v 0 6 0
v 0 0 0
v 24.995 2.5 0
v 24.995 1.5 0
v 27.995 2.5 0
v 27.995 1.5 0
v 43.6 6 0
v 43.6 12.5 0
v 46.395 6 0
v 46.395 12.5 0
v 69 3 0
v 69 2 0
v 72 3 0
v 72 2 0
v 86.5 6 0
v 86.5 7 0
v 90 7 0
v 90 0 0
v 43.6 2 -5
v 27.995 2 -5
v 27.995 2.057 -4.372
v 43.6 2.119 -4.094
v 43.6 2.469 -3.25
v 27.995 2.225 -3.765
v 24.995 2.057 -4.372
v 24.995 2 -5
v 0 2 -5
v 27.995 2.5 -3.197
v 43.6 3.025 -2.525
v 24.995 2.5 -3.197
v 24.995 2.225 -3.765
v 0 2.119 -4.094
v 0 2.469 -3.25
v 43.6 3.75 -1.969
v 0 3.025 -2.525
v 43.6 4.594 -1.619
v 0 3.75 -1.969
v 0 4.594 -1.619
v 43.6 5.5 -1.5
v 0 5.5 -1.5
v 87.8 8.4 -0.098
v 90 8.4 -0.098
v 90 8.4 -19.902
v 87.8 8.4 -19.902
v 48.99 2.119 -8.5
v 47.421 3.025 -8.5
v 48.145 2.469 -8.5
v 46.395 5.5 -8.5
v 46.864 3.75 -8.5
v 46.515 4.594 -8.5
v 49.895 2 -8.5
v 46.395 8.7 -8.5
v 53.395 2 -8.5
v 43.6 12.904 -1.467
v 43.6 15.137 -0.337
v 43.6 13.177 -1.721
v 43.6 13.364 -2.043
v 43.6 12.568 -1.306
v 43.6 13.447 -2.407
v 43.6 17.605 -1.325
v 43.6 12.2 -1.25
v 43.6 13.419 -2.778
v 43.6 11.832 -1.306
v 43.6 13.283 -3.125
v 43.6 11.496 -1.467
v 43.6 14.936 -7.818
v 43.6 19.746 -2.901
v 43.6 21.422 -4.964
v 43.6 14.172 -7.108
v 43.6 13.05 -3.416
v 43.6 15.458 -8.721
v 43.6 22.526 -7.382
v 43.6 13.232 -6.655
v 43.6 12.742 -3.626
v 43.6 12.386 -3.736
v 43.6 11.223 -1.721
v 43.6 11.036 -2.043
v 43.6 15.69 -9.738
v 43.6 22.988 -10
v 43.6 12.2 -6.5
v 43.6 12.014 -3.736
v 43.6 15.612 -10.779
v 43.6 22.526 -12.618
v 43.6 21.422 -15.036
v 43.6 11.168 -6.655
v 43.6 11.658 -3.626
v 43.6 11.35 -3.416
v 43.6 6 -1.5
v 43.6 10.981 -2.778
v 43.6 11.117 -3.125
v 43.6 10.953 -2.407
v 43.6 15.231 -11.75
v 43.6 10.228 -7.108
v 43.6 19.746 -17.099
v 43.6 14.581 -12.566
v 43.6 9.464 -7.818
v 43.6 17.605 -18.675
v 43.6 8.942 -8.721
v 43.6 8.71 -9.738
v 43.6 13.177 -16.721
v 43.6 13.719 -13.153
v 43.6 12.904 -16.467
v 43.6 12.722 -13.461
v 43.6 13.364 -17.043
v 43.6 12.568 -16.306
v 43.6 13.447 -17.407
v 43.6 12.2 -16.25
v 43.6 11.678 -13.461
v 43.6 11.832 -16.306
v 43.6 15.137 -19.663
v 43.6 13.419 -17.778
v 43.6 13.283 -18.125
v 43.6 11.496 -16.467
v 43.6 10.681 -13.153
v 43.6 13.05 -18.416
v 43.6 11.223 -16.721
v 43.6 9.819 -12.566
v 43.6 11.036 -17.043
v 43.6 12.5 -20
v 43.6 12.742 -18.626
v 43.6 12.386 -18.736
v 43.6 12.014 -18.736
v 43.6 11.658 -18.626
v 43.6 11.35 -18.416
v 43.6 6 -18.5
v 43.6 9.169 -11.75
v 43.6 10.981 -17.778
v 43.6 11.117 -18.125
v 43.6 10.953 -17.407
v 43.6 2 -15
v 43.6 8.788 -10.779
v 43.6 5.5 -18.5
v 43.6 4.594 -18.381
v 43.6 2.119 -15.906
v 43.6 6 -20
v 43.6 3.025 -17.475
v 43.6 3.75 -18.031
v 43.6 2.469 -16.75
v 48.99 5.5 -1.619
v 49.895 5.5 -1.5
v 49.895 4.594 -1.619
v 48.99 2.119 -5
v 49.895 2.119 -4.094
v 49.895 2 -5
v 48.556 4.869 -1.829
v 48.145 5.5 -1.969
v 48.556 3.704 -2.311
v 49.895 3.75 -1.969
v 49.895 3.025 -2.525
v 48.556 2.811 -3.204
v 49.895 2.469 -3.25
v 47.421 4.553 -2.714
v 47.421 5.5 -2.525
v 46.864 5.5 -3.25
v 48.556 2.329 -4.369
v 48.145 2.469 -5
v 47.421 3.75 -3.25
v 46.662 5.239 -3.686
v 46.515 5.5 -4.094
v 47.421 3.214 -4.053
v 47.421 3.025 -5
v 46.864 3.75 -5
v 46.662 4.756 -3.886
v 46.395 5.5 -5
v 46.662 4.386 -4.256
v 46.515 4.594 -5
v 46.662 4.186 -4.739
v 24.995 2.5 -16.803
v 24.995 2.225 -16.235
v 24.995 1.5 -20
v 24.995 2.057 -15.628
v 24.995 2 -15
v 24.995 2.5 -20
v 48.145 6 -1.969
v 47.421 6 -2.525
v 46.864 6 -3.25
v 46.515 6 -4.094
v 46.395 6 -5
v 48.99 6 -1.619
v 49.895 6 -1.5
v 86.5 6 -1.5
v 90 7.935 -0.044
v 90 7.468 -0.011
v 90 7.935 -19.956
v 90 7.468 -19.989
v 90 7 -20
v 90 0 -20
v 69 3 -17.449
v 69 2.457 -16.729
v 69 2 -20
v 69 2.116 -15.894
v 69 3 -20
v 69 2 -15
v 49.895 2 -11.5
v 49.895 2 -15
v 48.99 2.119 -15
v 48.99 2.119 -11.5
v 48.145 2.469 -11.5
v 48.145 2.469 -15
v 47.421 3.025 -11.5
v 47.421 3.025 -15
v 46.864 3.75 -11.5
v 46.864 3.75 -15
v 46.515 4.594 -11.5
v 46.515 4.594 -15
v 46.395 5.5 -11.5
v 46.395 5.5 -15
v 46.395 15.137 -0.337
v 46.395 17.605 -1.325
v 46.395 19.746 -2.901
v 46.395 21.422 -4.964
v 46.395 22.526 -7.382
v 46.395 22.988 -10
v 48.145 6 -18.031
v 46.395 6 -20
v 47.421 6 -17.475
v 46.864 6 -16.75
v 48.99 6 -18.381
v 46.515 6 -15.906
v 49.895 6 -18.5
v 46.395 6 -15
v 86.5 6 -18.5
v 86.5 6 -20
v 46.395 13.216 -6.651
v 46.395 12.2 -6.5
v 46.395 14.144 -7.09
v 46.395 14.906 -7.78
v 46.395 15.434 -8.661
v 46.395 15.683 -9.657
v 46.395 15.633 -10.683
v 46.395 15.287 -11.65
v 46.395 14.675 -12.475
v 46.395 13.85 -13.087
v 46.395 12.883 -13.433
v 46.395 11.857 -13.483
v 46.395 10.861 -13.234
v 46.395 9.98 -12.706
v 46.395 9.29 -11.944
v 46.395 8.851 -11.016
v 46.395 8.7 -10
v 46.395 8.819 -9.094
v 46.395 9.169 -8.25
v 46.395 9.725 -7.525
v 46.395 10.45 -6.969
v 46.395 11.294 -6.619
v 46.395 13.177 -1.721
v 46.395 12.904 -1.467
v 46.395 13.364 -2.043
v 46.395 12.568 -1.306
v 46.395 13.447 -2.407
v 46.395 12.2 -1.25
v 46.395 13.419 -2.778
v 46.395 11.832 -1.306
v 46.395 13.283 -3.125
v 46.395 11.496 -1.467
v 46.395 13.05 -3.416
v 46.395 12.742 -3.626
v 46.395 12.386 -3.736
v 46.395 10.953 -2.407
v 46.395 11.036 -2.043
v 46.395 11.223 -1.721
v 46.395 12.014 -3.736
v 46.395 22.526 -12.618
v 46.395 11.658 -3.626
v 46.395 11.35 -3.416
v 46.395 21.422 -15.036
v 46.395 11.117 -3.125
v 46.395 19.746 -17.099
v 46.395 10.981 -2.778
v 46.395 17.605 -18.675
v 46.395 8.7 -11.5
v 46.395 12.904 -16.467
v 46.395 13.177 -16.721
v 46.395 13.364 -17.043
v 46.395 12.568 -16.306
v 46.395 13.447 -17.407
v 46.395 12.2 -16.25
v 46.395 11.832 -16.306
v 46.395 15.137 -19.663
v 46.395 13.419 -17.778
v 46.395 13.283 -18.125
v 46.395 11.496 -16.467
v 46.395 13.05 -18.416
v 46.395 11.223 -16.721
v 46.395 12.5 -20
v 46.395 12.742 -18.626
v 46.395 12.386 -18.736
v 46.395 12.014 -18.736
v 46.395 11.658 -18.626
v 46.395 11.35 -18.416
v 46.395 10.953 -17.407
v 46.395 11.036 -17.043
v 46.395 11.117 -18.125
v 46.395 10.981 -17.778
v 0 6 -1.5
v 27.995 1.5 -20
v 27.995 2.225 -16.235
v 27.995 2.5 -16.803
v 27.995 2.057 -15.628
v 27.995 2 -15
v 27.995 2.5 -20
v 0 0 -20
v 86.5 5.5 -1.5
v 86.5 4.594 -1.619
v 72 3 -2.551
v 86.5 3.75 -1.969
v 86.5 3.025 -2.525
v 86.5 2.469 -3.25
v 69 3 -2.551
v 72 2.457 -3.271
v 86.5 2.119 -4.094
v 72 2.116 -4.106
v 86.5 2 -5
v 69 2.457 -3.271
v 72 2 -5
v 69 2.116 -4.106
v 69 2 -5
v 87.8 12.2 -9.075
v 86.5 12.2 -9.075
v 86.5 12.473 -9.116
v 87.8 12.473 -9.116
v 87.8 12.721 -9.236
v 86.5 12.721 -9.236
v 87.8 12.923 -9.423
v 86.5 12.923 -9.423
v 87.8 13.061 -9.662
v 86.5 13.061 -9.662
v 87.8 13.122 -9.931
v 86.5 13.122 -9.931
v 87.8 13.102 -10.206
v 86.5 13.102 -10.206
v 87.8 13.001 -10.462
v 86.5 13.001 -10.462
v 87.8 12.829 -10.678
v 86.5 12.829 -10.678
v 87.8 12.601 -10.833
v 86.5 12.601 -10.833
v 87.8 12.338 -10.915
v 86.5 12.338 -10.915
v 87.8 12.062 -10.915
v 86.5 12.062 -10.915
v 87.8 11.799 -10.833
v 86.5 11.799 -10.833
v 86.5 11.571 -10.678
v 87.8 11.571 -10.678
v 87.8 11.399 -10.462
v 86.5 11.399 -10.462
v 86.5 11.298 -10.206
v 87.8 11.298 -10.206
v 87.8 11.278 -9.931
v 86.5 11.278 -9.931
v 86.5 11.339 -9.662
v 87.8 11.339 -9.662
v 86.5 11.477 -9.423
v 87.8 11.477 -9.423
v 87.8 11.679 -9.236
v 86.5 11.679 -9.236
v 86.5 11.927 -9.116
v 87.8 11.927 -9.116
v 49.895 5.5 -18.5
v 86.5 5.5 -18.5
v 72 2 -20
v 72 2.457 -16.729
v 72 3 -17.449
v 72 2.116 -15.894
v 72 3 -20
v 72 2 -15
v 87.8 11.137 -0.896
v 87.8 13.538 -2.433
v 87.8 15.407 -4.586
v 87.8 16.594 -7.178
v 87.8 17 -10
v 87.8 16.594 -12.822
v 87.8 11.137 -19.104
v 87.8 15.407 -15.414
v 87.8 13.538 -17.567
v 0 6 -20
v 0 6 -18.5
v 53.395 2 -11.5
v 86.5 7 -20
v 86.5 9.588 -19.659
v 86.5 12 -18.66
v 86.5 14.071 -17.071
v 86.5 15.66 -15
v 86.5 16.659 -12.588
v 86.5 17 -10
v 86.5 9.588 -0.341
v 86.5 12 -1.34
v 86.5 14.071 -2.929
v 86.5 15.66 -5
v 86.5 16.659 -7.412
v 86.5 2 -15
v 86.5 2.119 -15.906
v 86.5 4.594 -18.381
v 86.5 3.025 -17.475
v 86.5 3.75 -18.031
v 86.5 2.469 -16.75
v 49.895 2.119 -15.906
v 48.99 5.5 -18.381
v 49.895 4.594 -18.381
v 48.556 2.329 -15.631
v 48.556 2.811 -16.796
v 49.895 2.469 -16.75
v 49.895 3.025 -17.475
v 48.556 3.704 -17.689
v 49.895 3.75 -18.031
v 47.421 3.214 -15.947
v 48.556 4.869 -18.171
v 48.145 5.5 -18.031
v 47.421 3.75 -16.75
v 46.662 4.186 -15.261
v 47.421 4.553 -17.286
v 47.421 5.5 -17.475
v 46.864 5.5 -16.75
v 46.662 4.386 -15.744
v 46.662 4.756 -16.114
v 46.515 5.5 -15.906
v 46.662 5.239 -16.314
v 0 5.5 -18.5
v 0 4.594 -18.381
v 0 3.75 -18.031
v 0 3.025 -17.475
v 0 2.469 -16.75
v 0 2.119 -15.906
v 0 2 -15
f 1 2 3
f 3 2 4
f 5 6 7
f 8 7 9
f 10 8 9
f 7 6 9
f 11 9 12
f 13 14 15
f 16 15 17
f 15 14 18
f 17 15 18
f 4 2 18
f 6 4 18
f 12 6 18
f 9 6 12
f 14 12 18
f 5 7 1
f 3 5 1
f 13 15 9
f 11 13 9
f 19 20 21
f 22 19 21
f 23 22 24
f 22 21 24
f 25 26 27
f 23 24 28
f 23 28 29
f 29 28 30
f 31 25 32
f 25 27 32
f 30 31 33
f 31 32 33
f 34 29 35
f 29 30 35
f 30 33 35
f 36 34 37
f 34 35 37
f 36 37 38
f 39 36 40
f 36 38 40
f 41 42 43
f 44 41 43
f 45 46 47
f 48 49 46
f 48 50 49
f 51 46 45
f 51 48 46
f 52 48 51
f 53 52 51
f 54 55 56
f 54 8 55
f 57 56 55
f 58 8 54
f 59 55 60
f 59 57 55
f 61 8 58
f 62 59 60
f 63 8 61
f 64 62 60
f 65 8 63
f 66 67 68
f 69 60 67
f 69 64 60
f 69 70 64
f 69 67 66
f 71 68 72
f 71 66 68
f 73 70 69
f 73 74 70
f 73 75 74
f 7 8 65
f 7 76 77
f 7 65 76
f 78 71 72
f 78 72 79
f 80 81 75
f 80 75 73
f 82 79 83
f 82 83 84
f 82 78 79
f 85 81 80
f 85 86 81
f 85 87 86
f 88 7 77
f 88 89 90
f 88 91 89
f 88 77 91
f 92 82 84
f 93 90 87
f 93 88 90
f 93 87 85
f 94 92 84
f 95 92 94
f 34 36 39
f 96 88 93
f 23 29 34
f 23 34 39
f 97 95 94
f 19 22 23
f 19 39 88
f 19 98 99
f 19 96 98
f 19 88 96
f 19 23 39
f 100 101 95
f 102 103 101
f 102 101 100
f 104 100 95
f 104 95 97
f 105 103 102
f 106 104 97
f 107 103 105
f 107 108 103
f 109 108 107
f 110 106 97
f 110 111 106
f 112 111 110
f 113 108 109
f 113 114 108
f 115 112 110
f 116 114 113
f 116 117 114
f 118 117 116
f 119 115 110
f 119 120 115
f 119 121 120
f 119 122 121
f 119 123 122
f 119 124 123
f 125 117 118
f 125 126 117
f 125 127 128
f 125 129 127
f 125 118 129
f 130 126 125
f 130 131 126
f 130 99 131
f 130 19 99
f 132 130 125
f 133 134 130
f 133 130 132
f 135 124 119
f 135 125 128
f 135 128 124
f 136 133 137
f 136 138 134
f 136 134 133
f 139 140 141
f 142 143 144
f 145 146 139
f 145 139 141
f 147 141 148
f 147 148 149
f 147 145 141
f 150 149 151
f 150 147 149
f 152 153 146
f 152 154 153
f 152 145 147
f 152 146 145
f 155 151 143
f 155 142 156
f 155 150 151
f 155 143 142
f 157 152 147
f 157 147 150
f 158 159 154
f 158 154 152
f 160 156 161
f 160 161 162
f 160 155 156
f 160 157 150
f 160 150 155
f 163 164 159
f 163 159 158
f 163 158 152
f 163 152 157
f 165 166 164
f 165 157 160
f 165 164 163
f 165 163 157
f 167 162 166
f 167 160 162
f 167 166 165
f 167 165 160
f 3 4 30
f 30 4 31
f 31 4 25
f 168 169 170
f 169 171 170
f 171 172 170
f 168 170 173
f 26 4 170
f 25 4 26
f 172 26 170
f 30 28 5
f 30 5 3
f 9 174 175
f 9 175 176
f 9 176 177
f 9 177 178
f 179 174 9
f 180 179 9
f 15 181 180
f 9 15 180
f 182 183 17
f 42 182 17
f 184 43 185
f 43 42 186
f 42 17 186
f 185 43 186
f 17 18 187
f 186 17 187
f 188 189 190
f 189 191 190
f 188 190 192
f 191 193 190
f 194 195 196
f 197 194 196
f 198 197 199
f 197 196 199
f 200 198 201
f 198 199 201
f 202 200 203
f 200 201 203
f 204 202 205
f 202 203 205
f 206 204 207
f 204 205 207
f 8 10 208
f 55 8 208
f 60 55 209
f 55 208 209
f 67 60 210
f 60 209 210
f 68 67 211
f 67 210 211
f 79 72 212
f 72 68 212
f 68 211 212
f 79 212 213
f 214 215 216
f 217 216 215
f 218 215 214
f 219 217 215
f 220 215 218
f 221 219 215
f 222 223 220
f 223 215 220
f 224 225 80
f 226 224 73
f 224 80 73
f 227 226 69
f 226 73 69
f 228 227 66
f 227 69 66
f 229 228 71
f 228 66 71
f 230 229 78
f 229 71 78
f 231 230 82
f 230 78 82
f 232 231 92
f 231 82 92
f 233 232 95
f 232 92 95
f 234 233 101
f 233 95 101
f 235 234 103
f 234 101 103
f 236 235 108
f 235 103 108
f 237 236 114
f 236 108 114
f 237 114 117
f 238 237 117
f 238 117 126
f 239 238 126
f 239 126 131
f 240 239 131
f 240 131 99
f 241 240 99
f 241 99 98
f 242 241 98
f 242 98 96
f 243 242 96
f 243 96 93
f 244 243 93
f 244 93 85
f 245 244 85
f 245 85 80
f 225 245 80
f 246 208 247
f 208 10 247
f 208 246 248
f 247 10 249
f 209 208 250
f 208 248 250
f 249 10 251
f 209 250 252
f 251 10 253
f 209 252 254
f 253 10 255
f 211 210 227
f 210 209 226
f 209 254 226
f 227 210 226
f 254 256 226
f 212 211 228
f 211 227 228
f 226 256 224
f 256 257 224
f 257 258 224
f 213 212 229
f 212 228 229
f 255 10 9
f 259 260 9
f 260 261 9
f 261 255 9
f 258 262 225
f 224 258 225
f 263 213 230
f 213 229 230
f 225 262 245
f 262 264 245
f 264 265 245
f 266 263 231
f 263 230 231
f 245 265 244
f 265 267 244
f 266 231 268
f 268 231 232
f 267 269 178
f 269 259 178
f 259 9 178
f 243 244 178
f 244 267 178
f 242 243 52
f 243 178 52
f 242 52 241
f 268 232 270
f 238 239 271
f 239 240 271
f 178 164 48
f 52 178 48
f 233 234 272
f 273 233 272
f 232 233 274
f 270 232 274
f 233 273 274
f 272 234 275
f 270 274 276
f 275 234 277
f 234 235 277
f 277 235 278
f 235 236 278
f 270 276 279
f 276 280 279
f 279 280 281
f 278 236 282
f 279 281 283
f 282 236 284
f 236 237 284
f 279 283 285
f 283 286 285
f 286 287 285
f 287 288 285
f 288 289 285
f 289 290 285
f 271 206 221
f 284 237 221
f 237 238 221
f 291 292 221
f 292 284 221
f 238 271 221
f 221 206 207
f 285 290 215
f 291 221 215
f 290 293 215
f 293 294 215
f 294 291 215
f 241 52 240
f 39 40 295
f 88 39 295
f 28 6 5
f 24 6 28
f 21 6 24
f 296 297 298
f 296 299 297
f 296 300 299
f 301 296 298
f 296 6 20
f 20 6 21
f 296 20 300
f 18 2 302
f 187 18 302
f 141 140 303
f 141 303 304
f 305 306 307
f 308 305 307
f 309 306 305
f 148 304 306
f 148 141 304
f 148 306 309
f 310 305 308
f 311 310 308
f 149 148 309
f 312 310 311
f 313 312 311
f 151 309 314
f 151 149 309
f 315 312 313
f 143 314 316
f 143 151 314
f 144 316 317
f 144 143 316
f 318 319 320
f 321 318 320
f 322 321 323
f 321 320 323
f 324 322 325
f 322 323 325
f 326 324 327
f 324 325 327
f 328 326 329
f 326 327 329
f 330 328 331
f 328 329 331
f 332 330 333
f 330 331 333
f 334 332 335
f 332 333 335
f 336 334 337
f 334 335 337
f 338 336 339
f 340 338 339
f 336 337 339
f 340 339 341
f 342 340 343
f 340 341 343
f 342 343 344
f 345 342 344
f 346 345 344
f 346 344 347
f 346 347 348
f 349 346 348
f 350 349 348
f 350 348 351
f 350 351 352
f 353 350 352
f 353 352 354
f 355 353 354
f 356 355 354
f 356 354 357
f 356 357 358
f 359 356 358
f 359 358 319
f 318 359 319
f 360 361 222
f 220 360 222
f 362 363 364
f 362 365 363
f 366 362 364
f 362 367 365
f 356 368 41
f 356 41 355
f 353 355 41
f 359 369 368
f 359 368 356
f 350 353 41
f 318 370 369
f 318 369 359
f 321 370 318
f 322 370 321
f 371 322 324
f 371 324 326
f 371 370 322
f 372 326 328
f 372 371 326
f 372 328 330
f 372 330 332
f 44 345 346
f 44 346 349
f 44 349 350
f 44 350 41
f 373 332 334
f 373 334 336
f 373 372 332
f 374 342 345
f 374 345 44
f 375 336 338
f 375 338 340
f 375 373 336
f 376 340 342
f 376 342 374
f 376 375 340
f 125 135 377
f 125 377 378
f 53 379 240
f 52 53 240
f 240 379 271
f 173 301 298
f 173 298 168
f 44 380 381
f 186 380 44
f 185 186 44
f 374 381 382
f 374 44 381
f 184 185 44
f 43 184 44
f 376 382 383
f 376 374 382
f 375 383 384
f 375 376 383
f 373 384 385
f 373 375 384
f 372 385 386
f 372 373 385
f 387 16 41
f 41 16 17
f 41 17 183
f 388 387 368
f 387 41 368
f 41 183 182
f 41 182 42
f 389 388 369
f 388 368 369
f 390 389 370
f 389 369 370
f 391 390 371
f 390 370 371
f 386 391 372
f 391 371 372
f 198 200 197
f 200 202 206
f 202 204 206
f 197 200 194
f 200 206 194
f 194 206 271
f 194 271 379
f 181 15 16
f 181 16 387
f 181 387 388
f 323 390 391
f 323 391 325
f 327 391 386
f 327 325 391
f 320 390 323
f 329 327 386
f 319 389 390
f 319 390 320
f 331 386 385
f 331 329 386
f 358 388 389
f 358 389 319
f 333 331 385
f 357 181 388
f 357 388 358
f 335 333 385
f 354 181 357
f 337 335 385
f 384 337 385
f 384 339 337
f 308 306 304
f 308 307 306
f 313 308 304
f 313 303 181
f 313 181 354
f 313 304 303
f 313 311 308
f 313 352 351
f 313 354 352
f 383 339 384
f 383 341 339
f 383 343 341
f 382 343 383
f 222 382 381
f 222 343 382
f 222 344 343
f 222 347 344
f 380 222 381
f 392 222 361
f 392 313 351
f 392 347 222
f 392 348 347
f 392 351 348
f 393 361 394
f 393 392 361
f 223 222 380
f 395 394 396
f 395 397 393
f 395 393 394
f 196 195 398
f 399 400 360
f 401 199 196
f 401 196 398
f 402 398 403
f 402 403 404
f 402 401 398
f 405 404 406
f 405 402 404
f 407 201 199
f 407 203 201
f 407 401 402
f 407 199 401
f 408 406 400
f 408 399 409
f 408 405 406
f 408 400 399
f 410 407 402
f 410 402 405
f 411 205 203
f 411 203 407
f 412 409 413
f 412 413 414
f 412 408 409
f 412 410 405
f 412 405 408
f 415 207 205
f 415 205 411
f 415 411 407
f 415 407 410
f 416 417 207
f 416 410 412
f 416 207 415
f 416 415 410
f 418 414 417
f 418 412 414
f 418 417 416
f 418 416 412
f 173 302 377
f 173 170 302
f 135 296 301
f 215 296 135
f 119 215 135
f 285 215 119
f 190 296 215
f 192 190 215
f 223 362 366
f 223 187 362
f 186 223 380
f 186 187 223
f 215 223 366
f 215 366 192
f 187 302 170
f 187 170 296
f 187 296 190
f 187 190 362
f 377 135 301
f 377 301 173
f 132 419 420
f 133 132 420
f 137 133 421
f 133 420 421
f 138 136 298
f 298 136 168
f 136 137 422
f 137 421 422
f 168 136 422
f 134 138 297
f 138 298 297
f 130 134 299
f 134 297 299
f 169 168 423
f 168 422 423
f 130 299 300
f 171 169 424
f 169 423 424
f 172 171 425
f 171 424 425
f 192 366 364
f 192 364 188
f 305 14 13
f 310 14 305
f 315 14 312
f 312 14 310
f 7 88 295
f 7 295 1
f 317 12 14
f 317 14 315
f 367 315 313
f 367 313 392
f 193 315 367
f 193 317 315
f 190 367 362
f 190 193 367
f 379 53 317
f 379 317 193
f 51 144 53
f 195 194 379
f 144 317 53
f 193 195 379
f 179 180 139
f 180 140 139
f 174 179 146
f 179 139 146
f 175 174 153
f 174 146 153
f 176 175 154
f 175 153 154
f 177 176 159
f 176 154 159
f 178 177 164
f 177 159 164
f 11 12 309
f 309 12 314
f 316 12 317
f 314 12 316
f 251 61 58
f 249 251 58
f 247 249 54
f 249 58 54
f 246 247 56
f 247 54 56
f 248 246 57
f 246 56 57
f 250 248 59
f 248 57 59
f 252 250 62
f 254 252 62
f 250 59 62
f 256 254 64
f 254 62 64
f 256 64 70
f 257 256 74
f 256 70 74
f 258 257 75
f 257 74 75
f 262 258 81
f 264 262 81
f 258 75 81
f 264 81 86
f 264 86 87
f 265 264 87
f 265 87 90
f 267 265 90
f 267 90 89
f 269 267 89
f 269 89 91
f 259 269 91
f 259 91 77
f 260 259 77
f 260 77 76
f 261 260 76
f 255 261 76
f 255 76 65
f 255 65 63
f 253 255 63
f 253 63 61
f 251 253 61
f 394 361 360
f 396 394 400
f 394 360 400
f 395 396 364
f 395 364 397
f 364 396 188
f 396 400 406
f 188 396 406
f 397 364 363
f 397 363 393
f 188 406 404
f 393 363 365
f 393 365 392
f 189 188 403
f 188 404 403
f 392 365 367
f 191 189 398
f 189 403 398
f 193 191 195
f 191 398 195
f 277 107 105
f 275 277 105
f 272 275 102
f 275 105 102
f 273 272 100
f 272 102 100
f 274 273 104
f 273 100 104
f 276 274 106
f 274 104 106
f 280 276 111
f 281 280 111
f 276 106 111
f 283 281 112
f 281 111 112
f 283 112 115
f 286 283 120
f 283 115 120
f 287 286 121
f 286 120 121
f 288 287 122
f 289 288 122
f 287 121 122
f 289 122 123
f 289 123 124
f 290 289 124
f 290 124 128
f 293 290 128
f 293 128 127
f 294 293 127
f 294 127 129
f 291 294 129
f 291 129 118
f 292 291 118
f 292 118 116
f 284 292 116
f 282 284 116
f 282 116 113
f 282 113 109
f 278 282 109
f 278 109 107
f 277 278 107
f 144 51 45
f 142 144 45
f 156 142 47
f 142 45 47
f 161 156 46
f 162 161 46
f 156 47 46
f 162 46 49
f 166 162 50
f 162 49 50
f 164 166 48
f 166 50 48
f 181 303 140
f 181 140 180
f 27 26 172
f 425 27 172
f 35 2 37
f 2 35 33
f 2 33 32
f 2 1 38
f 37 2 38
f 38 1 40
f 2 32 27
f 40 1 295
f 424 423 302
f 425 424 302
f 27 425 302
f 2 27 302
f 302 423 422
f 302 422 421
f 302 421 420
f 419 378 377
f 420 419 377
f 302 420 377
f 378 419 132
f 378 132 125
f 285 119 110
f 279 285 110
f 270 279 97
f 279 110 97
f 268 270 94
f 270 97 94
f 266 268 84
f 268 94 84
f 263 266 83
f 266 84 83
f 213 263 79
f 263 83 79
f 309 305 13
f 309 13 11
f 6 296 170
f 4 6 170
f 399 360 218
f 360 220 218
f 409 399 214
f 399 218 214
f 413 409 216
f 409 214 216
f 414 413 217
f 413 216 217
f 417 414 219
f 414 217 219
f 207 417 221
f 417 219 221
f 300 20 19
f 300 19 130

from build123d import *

# Parameters (mm, degrees)
SKETCH1_W                = 20
SKETCH1_H                = 2
BOSS_EXTRUDE1_DEPTH      = 90
SKETCH2_W                = 2.795480737
SKETCH2_H                = 20
BOSS_EXTRUDE2_DEPTH      = 21
SKETCH3_W                = 3.5
SKETCH3_H                = 20
BOSS_EXTRUDE3_DEPTH      = 15
FILLET1_R                = 10.5
FILLET2_R                = 10
BOSS_EXTRUDE4_REACH      = 93.71
SKETCH4_W                = 1.5
SKETCH4_H                = 4
CUT_EXTRUDE1_REACH       = 57.51
SKETCH5_R                = 1.25
SKETCH5_R_2              = 3.5
CUT_EXTRUDE2_REACH       = 93.71
SKETCH6_R                = 0.925
SKETCH7_W                = 20
SKETCH7_H                = 8.6
CUT_EXTRUDE3_DEPTH       = 2.2
FILLET3_R                = 3.5
FILLET4_R                = 3.5
SKETCH8_W                = 3
SKETCH8_H                = 1
ZIPTIEHOLE_DEPTH         = 96.0181678
BOSS_EXTRUDE5_DEPTH      = 1.5
BOSS_EXTRUDE5_DEPTH_BACK = 1.5


# Some blends are built 0.0001 mm under size
with BuildPart() as part:
    # Sketch1 → Boss-Extrude1 (new body)
    with BuildSketch(Plane(origin=(0, 0, 0), x_dir=(0, 0, -1), z_dir=(1, 0, 0))):
        with Locations((10, 1)):
            Rectangle(SKETCH1_W, SKETCH1_H)
    extrude(amount=BOSS_EXTRUDE1_DEPTH)

    # Sketch2 → Boss-Extrude2 (add)
    with BuildSketch(Plane(origin=(0, 2, 0), x_dir=(1, 0, 0), z_dir=(0, 1, 0))):
        with Locations((44.997740369, 10)):
            Rectangle(SKETCH2_W, SKETCH2_H)
    extrude(amount=BOSS_EXTRUDE2_DEPTH)

    # Sketch3 → Boss-Extrude3 (add)
    with BuildSketch(Plane(origin=(0, 2, 0), x_dir=(1, 0, 0), z_dir=(0, 1, 0))):
        with Locations((88.25, 10)):
            Rectangle(SKETCH3_W, SKETCH3_H)
    extrude(amount=BOSS_EXTRUDE3_DEPTH)

    # Fillet1
    # the kernel refuses this fillet: 10.5 mm, written as the material it takes off along each edge
    with BuildSketch(Plane(origin=(72.645480737, 23, 0), x_dir=(0, 0, -1), z_dir=(-1, 0, 0)), Plane(origin=(17.35, 23, -20), x_dir=(0, 0, 1), z_dir=(1, 0, 0))) as fillet1_piece_1:
        with BuildLine():
            CenterArc((FILLET1_R, FILLET1_R), FILLET1_R, 180, 90)
            Line((0, FILLET1_R), (0, 0))
            Line((0, 0), (FILLET1_R, 0))
        make_face()
    extrude(amount=55.295480737, mode=Mode.SUBTRACT)

    # Fillet2
    fillet2_edges = [part.edges().sort_by_distance(p)[0] for p in [
        (88.25, 17, -20),
        (88.25, 17, 0),
    ]]
    fillet(fillet2_edges, radius=FILLET2_R - 0.0001)  # a hair under: the kernel refuses the full size

    # Boss-Extrude4: up to this face of the body (flat: up to its plane)
    boss_extrude4_end = Plane(part.part.faces().sort_by_distance((0, 1, -10))[0])
    # Sketch4 → Boss-Extrude4 (add, up to the picked face)
    with BuildSketch(Plane.ZY.offset(-86.5), mode=Mode.PRIVATE) as boss_extrude4_sk1:
        with Locations((-0.75, 4)):
            Rectangle(SKETCH4_W, SKETCH4_H)
    boss_extrude4_tool1 = split(extrude(boss_extrude4_sk1.sketch, amount=BOSS_EXTRUDE4_REACH, mode=Mode.PRIVATE), bisect_by=boss_extrude4_end, keep=Keep.BOTH, mode=Mode.PRIVATE)
    # Sketch4 → Boss-Extrude4 (add, up to the picked face)
    with BuildSketch(Plane.ZY.offset(-86.5), mode=Mode.PRIVATE) as boss_extrude4_sk2:
        with Locations((-19.25, 4)):
            Rectangle(SKETCH4_W, SKETCH4_H)
    boss_extrude4_tool2 = split(extrude(boss_extrude4_sk2.sketch, amount=BOSS_EXTRUDE4_REACH, mode=Mode.PRIVATE), bisect_by=boss_extrude4_end, keep=Keep.BOTH, mode=Mode.PRIVATE)
    add(boss_extrude4_tool1.solids().sort_by(Axis((86.5, 4, -0.75), (-1, 0, 0)))[0])
    add(boss_extrude4_tool2.solids().sort_by(Axis((86.5, 4, -19.25), (-1, 0, 0)))[0])

    # Sketch5 → Cut-Extrude1 (cut, up to next)
    with BuildSketch(Plane.ZY.offset(-43.6), mode=Mode.PRIVATE) as cut_extrude1_sk1:
        with Locations((-17.5, 12.2)):
            Circle(SKETCH5_R)
    cut_extrude1_tool1 = extrude(cut_extrude1_sk1.sketch, amount=-CUT_EXTRUDE1_REACH, mode=Mode.PRIVATE) & part.part
    # Sketch5 → Cut-Extrude1 (cut, up to next)
    with BuildSketch(Plane.ZY.offset(-43.6), mode=Mode.PRIVATE) as cut_extrude1_sk2:
        with Locations((-2.5, 12.2)):
            Circle(SKETCH5_R)
    cut_extrude1_tool2 = extrude(cut_extrude1_sk2.sketch, amount=-CUT_EXTRUDE1_REACH, mode=Mode.PRIVATE) & part.part
    # Sketch5 → Cut-Extrude1 (cut, up to next)
    with BuildSketch(Plane.ZY.offset(-43.6), mode=Mode.PRIVATE) as cut_extrude1_sk3:
        with Locations((-10, 12.2)):
            Circle(SKETCH5_R_2)
    cut_extrude1_tool3 = extrude(cut_extrude1_sk3.sketch, amount=-CUT_EXTRUDE1_REACH, mode=Mode.PRIVATE) & part.part
    add(cut_extrude1_tool1.solids().sort_by_distance((43.6, 12.2, -17.5))[0], mode=Mode.SUBTRACT)
    add(cut_extrude1_tool2.solids().sort_by_distance((43.6, 12.2, -2.5))[0], mode=Mode.SUBTRACT)
    add(cut_extrude1_tool3.solids().sort_by_distance((43.6, 12.2, -10))[0], mode=Mode.SUBTRACT)

    # Sketch6 → Cut-Extrude2 (cut, up to next)
    with BuildSketch(Plane.ZY.offset(-86.5), mode=Mode.PRIVATE) as cut_extrude2_sk1:
        with Locations((-10, 12.2)):
            Circle(SKETCH6_R)
    cut_extrude2_tool1 = extrude(cut_extrude2_sk1.sketch, amount=-CUT_EXTRUDE2_REACH, mode=Mode.PRIVATE) & part.part
    add(cut_extrude2_tool1.solids().sort_by_distance((86.5, 12.2, -10))[0], mode=Mode.SUBTRACT)

    # Sketch7 → Cut-Extrude3 (cut)
    with BuildSketch(Plane(origin=(90, 0, 0), x_dir=(0, 0, -1), z_dir=(1, 0, 0))):
        with Locations((10, 12.7)):
            Rectangle(SKETCH7_W, SKETCH7_H)
    extrude(amount=-CUT_EXTRUDE3_DEPTH, mode=Mode.SUBTRACT)

    # Fillet3
    fillet3_edges = [part.edges().sort_by_distance(p)[0] for p in [
        (21.8, 2, -1.5),
        (66.447740368, 2, -1.5),
        (66.447740368, 2, -18.5),
        (21.8, 2, -18.5),
    ]]
    fillet(fillet3_edges, radius=FILLET3_R)

    # Fillet4
    fillet4_edges = [part.edges().sort_by_distance(p)[0] for p in [
        (46.395480737, 2, -10),
        (46.395480737, 5.75, -1.5),
        (46.395480737, 3.025126266, -17.474873734),
        (46.395480737, 3.025126266, -2.525126266),
        (46.395480737, 5.75, -18.5),
    ]]
    fillet(fillet4_edges, radius=FILLET4_R)

    # Sketch8 → zipTieHole (cut, through all)
    with BuildSketch(Plane(origin=(0, 0, -20), x_dir=(-1, 0, 0), z_dir=(0, 0, -1))):
        with Locations((-26.4949995, 2)):
            Rectangle(SKETCH8_W, SKETCH8_H)
        with Locations((-70.5, 2.5)):
            Rectangle(SKETCH8_W, SKETCH8_H)
    extrude(amount=-ZIPTIEHOLE_DEPTH, mode=Mode.SUBTRACT)

    # Sketch10 → Boss-Extrude5 (add, two sides: drawn at the far end of the back side and taken through both)
    with BuildSketch(Plane(origin=(46.395480737, 5.5, -10), x_dir=(1, 0, 0), z_dir=(0, 0, 1)).offset(-BOSS_EXTRUDE5_DEPTH_BACK)):
        Polygon((7, -3.5), (0, 3.2), (0, -3.5), align=None)
    extrude(amount=BOSS_EXTRUDE5_DEPTH + BOSS_EXTRUDE5_DEPTH_BACK)


solid = part.part
